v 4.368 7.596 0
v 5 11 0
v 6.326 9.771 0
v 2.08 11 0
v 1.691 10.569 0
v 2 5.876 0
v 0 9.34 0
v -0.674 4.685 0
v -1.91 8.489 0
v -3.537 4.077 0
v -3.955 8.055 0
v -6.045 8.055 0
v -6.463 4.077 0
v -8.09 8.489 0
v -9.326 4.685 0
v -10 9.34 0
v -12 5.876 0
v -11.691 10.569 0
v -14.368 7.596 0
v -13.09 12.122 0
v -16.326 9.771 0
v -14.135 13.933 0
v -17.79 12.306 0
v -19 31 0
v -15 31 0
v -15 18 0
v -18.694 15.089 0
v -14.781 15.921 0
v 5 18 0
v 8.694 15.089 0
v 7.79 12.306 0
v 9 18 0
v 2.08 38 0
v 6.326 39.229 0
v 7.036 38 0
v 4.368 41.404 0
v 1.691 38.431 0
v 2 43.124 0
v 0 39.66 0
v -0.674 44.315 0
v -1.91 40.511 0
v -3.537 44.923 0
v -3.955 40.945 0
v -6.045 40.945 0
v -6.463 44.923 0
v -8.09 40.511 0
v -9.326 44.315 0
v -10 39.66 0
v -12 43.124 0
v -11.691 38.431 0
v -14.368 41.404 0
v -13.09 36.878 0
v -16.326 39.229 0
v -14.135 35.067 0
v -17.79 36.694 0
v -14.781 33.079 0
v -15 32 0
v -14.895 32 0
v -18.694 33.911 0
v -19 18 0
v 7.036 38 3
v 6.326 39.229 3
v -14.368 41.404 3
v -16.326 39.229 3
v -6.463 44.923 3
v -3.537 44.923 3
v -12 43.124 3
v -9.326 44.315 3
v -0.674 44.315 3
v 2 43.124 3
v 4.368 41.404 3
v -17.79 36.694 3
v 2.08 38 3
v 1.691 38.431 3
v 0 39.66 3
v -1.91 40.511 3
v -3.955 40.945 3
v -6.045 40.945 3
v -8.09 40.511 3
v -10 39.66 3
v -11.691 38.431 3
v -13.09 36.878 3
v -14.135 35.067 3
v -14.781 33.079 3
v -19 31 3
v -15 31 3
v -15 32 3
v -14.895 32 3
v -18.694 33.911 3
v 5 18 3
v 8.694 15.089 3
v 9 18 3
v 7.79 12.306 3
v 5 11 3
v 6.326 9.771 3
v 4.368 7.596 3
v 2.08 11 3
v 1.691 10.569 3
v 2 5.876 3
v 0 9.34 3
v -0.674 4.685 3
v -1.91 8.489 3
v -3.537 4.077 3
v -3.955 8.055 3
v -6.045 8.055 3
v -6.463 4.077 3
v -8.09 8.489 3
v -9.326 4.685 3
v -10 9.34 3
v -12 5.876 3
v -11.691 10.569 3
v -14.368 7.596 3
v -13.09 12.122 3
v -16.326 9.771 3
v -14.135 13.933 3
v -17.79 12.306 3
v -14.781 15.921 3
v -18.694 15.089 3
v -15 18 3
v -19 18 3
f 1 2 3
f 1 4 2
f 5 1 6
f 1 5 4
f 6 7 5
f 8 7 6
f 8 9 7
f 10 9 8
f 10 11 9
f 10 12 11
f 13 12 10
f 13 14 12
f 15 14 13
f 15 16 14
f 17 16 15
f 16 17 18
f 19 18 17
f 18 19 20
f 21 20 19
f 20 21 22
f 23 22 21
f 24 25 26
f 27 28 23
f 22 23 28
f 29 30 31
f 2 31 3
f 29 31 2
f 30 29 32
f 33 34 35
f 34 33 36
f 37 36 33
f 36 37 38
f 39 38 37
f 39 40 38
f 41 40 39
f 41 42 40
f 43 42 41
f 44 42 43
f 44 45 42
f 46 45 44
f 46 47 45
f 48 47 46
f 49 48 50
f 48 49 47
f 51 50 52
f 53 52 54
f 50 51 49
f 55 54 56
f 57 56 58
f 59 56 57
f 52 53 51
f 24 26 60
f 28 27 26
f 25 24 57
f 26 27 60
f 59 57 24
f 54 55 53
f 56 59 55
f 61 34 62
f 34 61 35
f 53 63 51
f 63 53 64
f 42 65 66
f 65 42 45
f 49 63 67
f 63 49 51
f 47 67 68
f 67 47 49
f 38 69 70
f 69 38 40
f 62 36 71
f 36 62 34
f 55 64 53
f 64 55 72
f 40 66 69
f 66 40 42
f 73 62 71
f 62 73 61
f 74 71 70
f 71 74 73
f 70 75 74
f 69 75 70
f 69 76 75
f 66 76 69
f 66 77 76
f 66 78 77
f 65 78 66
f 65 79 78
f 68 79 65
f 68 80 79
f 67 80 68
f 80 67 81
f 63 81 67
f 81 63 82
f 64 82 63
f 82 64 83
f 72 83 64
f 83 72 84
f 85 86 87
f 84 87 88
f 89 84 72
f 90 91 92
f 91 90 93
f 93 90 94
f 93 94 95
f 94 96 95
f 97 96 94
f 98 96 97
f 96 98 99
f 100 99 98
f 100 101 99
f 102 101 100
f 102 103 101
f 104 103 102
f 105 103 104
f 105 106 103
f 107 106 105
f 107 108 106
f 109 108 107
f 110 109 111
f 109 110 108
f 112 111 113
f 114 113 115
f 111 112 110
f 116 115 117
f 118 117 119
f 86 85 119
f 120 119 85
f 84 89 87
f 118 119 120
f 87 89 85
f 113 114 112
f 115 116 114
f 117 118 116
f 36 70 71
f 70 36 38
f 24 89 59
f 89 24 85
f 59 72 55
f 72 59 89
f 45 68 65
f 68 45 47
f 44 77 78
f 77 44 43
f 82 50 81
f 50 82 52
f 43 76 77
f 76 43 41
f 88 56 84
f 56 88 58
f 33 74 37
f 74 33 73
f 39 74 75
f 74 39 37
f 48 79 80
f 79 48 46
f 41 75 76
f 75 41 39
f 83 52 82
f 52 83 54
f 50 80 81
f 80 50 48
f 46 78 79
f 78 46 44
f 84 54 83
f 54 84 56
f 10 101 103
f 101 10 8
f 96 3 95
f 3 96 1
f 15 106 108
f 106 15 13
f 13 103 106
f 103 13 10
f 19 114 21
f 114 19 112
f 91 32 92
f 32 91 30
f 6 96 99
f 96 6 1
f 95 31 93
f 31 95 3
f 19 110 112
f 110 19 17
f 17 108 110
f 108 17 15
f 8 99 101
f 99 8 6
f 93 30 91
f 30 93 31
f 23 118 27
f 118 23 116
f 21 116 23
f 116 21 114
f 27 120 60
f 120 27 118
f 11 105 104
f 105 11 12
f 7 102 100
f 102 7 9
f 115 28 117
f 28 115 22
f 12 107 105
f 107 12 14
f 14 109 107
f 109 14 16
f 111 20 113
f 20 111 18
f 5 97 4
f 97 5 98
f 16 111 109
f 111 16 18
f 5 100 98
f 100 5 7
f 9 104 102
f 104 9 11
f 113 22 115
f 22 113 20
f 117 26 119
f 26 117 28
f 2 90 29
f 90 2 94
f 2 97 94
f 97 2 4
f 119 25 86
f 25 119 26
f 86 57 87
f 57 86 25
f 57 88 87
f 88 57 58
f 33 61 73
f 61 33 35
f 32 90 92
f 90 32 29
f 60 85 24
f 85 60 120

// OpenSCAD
x=3;
y=13;
z=5;
// буква с
translate([-45,5,0])
union(){

translate([26,13,0]) cube([x+1,y,x]);
difference(){
union(){
	
  difference(){
  translate([40,26,0]) cylinder(x,y+1,y+1);
  translate([40,26,-1]) cylinder(z,z+5,z+5);
  translate([33,12,-1]) cube([y+7,y+7,z]);

}

difference(){
  translate([40,13,0]) cylinder(x,y+1,y+1);
  translate([40,13,-1]) cylinder(z,z+5,z+5);
  translate([32,15,-1]) cube([y+6,y,z]);
  translate([40,6,-1]) cube(x+7);
}
}
  translate([30,13,-1]) cube([5,14,z]);
  translate([42,13,-1]) cube(20);
}
}
